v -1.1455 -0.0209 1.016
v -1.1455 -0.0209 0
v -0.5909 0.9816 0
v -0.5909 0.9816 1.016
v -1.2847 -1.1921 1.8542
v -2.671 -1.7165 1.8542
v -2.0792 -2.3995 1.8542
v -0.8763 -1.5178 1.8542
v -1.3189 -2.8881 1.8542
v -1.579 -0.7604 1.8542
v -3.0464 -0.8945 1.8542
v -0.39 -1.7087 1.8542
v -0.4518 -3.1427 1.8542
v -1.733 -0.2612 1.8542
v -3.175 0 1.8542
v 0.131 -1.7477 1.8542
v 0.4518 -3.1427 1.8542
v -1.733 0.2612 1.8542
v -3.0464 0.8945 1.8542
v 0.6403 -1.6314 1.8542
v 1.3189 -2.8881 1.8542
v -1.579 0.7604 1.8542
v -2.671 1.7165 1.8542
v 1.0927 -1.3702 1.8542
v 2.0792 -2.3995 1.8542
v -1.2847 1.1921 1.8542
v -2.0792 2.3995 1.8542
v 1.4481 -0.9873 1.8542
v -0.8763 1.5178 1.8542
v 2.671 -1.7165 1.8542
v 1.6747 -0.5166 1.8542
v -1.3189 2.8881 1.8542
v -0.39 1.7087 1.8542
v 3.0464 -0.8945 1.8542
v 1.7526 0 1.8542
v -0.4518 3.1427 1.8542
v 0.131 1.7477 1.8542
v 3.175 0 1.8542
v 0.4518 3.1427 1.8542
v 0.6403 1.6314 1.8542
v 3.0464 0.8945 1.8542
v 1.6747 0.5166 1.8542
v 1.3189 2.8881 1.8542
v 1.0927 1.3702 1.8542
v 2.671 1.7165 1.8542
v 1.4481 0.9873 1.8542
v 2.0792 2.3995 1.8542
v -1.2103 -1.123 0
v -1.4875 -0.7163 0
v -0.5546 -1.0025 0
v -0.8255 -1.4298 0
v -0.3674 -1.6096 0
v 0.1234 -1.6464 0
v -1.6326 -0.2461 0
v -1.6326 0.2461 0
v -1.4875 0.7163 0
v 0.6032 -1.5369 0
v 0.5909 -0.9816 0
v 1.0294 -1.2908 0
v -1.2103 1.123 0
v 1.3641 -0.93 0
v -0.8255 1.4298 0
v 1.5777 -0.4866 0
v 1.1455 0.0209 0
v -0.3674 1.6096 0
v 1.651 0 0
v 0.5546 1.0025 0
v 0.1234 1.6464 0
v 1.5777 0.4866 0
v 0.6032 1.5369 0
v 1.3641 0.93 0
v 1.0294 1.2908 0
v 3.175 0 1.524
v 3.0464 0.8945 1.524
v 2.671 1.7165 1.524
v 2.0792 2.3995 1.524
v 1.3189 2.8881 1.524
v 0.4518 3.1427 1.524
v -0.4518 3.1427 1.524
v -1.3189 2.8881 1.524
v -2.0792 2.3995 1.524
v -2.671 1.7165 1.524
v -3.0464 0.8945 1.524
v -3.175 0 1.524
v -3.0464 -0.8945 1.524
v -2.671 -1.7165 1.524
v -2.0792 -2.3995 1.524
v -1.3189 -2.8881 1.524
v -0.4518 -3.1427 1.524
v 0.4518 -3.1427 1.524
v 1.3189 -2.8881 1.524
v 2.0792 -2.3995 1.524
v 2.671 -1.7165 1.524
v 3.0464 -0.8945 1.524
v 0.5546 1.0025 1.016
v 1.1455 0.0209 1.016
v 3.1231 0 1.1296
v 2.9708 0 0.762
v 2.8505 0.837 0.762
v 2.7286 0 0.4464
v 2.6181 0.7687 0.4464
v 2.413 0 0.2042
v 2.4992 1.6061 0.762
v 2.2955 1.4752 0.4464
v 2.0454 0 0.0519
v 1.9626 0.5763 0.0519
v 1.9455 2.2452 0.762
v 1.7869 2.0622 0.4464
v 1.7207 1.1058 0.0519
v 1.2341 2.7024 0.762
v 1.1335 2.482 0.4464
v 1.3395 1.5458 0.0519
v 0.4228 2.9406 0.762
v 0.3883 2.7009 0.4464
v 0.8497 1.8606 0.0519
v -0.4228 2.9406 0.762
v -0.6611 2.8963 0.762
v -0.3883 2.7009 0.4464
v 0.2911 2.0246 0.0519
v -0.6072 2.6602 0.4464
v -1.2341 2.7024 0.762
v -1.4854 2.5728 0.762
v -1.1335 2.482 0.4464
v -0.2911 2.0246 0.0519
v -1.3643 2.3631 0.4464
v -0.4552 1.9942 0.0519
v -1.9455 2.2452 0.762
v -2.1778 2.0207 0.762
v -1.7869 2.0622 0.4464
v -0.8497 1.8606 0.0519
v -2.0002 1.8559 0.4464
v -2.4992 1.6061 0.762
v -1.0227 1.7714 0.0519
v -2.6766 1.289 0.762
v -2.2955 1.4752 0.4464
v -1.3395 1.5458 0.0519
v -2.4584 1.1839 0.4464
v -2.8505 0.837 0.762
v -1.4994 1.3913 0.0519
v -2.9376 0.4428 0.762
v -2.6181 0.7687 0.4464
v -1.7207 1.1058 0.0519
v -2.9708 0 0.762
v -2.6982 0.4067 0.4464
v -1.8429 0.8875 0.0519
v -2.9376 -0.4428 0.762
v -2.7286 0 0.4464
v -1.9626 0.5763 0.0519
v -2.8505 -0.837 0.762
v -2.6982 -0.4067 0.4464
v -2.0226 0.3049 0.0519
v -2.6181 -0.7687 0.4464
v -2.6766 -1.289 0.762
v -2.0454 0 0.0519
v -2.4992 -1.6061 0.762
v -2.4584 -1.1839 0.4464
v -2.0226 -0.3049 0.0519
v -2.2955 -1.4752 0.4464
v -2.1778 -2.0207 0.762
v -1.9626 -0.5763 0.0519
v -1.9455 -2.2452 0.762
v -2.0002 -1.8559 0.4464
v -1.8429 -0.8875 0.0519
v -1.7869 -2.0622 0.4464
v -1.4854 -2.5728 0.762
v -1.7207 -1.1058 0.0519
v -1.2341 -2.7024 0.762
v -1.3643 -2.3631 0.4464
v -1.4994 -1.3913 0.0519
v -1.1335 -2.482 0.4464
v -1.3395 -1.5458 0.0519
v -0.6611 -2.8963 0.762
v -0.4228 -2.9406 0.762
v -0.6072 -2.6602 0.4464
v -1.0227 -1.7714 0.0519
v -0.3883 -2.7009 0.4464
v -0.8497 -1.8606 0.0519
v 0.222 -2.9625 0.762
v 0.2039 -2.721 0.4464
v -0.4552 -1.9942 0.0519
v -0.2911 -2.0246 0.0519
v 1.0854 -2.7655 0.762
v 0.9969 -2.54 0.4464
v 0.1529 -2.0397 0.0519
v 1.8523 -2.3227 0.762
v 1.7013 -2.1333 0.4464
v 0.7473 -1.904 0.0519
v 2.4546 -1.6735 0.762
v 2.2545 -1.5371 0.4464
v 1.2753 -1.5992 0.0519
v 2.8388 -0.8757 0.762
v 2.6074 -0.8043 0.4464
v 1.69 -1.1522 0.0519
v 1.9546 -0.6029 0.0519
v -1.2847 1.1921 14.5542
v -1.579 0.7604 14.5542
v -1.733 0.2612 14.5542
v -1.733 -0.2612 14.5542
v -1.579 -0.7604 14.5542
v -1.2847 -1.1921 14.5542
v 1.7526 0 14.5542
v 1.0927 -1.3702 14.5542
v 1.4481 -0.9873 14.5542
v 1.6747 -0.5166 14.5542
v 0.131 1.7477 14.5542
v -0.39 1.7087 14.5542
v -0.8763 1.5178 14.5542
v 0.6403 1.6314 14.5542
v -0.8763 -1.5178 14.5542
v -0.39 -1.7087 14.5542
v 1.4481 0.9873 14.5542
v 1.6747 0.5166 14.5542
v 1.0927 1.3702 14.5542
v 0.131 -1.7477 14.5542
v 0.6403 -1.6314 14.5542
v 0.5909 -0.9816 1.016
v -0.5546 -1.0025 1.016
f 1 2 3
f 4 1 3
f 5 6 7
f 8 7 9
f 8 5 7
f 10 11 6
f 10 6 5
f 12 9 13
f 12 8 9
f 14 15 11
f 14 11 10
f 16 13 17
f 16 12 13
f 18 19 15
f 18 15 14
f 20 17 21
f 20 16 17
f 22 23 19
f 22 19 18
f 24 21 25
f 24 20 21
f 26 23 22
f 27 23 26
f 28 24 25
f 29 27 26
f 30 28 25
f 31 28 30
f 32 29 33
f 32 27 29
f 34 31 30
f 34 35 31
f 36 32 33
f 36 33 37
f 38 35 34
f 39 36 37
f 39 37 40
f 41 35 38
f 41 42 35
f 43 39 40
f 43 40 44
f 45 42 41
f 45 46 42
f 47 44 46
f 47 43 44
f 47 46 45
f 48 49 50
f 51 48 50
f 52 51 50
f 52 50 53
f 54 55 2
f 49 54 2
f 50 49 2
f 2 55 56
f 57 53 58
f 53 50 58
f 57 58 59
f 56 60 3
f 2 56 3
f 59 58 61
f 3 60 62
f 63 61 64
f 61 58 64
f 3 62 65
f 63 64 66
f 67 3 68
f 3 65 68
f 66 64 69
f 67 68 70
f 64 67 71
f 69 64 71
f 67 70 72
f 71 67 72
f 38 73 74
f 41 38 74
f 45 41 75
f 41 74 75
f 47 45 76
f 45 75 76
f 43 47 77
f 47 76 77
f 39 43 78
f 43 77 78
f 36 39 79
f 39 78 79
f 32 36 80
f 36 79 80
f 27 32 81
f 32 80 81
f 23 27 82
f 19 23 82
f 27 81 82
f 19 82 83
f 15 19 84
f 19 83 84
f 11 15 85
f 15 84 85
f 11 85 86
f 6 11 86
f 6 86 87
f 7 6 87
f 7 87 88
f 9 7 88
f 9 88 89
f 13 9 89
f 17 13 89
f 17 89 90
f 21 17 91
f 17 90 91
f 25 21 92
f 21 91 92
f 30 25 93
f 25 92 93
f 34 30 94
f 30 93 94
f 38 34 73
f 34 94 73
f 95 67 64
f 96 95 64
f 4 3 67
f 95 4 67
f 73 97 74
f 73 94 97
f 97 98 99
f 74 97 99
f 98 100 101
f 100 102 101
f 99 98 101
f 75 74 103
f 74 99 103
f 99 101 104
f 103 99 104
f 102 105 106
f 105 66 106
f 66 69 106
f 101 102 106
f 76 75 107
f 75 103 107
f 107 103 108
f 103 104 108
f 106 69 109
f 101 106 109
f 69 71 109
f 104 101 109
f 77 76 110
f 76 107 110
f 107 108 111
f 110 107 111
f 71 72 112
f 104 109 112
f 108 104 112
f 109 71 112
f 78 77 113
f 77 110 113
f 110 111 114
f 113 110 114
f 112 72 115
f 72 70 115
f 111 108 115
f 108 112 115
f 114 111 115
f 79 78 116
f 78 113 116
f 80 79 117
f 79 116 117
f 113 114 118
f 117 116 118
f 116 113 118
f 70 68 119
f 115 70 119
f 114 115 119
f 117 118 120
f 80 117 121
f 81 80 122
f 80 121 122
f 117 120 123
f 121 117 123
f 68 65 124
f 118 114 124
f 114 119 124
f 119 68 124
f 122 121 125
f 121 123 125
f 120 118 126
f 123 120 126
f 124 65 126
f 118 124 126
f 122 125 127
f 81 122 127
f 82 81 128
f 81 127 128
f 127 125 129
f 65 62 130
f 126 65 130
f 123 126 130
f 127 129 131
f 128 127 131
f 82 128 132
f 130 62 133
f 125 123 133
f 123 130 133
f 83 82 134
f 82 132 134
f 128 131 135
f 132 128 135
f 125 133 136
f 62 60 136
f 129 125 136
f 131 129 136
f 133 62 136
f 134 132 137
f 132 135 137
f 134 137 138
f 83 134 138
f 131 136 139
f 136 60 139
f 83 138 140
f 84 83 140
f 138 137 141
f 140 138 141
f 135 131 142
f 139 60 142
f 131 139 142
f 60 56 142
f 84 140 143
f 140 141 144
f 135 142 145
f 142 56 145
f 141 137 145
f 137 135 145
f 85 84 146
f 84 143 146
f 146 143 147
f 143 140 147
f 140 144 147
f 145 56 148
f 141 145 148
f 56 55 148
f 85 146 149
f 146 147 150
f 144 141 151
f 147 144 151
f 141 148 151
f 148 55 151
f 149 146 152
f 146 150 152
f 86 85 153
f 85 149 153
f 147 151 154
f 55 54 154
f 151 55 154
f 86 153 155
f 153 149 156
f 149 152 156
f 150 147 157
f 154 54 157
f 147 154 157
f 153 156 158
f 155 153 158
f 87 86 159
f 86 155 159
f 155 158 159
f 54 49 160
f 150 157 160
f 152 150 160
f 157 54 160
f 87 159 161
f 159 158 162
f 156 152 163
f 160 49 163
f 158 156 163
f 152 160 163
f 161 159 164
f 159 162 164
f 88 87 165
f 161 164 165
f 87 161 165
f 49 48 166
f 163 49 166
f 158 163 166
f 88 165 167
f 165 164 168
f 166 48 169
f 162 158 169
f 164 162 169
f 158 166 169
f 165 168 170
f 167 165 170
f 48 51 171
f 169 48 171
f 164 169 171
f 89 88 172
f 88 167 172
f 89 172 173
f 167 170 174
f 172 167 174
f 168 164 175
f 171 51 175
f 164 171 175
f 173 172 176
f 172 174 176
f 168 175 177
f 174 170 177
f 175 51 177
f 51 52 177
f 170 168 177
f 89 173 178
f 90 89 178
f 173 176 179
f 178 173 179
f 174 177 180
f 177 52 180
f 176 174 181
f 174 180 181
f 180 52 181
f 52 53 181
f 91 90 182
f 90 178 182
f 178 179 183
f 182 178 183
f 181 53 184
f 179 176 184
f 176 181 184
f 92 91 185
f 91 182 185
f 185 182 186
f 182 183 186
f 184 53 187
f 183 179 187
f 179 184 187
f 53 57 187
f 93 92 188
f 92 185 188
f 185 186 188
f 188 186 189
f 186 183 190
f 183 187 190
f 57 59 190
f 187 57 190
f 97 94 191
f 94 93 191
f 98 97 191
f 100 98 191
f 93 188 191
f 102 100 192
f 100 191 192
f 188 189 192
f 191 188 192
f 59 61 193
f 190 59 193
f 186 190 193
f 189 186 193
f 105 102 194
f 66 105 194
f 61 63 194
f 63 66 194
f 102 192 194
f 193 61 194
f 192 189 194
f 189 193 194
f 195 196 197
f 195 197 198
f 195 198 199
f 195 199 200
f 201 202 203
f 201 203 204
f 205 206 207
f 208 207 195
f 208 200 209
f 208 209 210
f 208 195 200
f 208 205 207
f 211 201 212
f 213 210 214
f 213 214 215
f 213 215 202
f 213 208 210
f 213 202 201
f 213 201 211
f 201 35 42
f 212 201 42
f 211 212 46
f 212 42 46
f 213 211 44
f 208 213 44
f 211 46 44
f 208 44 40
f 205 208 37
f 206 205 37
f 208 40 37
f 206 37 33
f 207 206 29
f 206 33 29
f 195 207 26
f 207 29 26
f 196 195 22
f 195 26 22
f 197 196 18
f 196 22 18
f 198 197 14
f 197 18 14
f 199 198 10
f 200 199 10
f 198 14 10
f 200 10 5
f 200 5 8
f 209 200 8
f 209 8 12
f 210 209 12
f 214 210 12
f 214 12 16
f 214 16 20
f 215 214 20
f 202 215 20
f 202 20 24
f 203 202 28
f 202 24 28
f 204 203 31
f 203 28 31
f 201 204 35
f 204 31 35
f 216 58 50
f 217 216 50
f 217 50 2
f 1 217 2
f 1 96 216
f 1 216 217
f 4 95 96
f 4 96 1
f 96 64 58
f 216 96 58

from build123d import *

# Parameters (mm, degrees)
SKETCH1_R      = 3.175
EXTRUDE1_DEPTH = 1.8542
FILLET1_R      = 1.524
SKETCH2_R      = 1.7526
EXTRUDE2_DEPTH = 12.7
EXTRUDE3_DEPTH = 1.016


with BuildPart() as part:
    # Sketch1 → Extrude1 (new body)
    with BuildSketch(Plane.XY):
        Circle(SKETCH1_R)
    extrude(amount=EXTRUDE1_DEPTH)

    # Fillet1
    fillet1_edges = [part.edges().sort_by_distance(p)[0] for p in [
        (-3.175, 0, 0),
    ]]
    fillet(fillet1_edges, radius=FILLET1_R)

    # Sketch2 → Extrude2 (add)
    with BuildSketch(Plane.XY.offset(1.8542)):
        Circle(SKETCH2_R)
    extrude(amount=EXTRUDE2_DEPTH)

    # Sketch3 → Extrude3 (cut)
    with BuildSketch(Plane(origin=(0, 0, 0), x_dir=(-1, 0, 0), z_dir=(0, 0, -1))):
        Polygon((0.59085384, 0.981566666), (-0.554634748, 1.002477769), (-1.145488588, 0.020911103), (-0.59085384, -0.981566666), (0.554634748, -1.002477769), (1.145488588, -0.020911103), align=None)
    extrude(amount=-EXTRUDE3_DEPTH, mode=Mode.SUBTRACT)


solid = part.part
